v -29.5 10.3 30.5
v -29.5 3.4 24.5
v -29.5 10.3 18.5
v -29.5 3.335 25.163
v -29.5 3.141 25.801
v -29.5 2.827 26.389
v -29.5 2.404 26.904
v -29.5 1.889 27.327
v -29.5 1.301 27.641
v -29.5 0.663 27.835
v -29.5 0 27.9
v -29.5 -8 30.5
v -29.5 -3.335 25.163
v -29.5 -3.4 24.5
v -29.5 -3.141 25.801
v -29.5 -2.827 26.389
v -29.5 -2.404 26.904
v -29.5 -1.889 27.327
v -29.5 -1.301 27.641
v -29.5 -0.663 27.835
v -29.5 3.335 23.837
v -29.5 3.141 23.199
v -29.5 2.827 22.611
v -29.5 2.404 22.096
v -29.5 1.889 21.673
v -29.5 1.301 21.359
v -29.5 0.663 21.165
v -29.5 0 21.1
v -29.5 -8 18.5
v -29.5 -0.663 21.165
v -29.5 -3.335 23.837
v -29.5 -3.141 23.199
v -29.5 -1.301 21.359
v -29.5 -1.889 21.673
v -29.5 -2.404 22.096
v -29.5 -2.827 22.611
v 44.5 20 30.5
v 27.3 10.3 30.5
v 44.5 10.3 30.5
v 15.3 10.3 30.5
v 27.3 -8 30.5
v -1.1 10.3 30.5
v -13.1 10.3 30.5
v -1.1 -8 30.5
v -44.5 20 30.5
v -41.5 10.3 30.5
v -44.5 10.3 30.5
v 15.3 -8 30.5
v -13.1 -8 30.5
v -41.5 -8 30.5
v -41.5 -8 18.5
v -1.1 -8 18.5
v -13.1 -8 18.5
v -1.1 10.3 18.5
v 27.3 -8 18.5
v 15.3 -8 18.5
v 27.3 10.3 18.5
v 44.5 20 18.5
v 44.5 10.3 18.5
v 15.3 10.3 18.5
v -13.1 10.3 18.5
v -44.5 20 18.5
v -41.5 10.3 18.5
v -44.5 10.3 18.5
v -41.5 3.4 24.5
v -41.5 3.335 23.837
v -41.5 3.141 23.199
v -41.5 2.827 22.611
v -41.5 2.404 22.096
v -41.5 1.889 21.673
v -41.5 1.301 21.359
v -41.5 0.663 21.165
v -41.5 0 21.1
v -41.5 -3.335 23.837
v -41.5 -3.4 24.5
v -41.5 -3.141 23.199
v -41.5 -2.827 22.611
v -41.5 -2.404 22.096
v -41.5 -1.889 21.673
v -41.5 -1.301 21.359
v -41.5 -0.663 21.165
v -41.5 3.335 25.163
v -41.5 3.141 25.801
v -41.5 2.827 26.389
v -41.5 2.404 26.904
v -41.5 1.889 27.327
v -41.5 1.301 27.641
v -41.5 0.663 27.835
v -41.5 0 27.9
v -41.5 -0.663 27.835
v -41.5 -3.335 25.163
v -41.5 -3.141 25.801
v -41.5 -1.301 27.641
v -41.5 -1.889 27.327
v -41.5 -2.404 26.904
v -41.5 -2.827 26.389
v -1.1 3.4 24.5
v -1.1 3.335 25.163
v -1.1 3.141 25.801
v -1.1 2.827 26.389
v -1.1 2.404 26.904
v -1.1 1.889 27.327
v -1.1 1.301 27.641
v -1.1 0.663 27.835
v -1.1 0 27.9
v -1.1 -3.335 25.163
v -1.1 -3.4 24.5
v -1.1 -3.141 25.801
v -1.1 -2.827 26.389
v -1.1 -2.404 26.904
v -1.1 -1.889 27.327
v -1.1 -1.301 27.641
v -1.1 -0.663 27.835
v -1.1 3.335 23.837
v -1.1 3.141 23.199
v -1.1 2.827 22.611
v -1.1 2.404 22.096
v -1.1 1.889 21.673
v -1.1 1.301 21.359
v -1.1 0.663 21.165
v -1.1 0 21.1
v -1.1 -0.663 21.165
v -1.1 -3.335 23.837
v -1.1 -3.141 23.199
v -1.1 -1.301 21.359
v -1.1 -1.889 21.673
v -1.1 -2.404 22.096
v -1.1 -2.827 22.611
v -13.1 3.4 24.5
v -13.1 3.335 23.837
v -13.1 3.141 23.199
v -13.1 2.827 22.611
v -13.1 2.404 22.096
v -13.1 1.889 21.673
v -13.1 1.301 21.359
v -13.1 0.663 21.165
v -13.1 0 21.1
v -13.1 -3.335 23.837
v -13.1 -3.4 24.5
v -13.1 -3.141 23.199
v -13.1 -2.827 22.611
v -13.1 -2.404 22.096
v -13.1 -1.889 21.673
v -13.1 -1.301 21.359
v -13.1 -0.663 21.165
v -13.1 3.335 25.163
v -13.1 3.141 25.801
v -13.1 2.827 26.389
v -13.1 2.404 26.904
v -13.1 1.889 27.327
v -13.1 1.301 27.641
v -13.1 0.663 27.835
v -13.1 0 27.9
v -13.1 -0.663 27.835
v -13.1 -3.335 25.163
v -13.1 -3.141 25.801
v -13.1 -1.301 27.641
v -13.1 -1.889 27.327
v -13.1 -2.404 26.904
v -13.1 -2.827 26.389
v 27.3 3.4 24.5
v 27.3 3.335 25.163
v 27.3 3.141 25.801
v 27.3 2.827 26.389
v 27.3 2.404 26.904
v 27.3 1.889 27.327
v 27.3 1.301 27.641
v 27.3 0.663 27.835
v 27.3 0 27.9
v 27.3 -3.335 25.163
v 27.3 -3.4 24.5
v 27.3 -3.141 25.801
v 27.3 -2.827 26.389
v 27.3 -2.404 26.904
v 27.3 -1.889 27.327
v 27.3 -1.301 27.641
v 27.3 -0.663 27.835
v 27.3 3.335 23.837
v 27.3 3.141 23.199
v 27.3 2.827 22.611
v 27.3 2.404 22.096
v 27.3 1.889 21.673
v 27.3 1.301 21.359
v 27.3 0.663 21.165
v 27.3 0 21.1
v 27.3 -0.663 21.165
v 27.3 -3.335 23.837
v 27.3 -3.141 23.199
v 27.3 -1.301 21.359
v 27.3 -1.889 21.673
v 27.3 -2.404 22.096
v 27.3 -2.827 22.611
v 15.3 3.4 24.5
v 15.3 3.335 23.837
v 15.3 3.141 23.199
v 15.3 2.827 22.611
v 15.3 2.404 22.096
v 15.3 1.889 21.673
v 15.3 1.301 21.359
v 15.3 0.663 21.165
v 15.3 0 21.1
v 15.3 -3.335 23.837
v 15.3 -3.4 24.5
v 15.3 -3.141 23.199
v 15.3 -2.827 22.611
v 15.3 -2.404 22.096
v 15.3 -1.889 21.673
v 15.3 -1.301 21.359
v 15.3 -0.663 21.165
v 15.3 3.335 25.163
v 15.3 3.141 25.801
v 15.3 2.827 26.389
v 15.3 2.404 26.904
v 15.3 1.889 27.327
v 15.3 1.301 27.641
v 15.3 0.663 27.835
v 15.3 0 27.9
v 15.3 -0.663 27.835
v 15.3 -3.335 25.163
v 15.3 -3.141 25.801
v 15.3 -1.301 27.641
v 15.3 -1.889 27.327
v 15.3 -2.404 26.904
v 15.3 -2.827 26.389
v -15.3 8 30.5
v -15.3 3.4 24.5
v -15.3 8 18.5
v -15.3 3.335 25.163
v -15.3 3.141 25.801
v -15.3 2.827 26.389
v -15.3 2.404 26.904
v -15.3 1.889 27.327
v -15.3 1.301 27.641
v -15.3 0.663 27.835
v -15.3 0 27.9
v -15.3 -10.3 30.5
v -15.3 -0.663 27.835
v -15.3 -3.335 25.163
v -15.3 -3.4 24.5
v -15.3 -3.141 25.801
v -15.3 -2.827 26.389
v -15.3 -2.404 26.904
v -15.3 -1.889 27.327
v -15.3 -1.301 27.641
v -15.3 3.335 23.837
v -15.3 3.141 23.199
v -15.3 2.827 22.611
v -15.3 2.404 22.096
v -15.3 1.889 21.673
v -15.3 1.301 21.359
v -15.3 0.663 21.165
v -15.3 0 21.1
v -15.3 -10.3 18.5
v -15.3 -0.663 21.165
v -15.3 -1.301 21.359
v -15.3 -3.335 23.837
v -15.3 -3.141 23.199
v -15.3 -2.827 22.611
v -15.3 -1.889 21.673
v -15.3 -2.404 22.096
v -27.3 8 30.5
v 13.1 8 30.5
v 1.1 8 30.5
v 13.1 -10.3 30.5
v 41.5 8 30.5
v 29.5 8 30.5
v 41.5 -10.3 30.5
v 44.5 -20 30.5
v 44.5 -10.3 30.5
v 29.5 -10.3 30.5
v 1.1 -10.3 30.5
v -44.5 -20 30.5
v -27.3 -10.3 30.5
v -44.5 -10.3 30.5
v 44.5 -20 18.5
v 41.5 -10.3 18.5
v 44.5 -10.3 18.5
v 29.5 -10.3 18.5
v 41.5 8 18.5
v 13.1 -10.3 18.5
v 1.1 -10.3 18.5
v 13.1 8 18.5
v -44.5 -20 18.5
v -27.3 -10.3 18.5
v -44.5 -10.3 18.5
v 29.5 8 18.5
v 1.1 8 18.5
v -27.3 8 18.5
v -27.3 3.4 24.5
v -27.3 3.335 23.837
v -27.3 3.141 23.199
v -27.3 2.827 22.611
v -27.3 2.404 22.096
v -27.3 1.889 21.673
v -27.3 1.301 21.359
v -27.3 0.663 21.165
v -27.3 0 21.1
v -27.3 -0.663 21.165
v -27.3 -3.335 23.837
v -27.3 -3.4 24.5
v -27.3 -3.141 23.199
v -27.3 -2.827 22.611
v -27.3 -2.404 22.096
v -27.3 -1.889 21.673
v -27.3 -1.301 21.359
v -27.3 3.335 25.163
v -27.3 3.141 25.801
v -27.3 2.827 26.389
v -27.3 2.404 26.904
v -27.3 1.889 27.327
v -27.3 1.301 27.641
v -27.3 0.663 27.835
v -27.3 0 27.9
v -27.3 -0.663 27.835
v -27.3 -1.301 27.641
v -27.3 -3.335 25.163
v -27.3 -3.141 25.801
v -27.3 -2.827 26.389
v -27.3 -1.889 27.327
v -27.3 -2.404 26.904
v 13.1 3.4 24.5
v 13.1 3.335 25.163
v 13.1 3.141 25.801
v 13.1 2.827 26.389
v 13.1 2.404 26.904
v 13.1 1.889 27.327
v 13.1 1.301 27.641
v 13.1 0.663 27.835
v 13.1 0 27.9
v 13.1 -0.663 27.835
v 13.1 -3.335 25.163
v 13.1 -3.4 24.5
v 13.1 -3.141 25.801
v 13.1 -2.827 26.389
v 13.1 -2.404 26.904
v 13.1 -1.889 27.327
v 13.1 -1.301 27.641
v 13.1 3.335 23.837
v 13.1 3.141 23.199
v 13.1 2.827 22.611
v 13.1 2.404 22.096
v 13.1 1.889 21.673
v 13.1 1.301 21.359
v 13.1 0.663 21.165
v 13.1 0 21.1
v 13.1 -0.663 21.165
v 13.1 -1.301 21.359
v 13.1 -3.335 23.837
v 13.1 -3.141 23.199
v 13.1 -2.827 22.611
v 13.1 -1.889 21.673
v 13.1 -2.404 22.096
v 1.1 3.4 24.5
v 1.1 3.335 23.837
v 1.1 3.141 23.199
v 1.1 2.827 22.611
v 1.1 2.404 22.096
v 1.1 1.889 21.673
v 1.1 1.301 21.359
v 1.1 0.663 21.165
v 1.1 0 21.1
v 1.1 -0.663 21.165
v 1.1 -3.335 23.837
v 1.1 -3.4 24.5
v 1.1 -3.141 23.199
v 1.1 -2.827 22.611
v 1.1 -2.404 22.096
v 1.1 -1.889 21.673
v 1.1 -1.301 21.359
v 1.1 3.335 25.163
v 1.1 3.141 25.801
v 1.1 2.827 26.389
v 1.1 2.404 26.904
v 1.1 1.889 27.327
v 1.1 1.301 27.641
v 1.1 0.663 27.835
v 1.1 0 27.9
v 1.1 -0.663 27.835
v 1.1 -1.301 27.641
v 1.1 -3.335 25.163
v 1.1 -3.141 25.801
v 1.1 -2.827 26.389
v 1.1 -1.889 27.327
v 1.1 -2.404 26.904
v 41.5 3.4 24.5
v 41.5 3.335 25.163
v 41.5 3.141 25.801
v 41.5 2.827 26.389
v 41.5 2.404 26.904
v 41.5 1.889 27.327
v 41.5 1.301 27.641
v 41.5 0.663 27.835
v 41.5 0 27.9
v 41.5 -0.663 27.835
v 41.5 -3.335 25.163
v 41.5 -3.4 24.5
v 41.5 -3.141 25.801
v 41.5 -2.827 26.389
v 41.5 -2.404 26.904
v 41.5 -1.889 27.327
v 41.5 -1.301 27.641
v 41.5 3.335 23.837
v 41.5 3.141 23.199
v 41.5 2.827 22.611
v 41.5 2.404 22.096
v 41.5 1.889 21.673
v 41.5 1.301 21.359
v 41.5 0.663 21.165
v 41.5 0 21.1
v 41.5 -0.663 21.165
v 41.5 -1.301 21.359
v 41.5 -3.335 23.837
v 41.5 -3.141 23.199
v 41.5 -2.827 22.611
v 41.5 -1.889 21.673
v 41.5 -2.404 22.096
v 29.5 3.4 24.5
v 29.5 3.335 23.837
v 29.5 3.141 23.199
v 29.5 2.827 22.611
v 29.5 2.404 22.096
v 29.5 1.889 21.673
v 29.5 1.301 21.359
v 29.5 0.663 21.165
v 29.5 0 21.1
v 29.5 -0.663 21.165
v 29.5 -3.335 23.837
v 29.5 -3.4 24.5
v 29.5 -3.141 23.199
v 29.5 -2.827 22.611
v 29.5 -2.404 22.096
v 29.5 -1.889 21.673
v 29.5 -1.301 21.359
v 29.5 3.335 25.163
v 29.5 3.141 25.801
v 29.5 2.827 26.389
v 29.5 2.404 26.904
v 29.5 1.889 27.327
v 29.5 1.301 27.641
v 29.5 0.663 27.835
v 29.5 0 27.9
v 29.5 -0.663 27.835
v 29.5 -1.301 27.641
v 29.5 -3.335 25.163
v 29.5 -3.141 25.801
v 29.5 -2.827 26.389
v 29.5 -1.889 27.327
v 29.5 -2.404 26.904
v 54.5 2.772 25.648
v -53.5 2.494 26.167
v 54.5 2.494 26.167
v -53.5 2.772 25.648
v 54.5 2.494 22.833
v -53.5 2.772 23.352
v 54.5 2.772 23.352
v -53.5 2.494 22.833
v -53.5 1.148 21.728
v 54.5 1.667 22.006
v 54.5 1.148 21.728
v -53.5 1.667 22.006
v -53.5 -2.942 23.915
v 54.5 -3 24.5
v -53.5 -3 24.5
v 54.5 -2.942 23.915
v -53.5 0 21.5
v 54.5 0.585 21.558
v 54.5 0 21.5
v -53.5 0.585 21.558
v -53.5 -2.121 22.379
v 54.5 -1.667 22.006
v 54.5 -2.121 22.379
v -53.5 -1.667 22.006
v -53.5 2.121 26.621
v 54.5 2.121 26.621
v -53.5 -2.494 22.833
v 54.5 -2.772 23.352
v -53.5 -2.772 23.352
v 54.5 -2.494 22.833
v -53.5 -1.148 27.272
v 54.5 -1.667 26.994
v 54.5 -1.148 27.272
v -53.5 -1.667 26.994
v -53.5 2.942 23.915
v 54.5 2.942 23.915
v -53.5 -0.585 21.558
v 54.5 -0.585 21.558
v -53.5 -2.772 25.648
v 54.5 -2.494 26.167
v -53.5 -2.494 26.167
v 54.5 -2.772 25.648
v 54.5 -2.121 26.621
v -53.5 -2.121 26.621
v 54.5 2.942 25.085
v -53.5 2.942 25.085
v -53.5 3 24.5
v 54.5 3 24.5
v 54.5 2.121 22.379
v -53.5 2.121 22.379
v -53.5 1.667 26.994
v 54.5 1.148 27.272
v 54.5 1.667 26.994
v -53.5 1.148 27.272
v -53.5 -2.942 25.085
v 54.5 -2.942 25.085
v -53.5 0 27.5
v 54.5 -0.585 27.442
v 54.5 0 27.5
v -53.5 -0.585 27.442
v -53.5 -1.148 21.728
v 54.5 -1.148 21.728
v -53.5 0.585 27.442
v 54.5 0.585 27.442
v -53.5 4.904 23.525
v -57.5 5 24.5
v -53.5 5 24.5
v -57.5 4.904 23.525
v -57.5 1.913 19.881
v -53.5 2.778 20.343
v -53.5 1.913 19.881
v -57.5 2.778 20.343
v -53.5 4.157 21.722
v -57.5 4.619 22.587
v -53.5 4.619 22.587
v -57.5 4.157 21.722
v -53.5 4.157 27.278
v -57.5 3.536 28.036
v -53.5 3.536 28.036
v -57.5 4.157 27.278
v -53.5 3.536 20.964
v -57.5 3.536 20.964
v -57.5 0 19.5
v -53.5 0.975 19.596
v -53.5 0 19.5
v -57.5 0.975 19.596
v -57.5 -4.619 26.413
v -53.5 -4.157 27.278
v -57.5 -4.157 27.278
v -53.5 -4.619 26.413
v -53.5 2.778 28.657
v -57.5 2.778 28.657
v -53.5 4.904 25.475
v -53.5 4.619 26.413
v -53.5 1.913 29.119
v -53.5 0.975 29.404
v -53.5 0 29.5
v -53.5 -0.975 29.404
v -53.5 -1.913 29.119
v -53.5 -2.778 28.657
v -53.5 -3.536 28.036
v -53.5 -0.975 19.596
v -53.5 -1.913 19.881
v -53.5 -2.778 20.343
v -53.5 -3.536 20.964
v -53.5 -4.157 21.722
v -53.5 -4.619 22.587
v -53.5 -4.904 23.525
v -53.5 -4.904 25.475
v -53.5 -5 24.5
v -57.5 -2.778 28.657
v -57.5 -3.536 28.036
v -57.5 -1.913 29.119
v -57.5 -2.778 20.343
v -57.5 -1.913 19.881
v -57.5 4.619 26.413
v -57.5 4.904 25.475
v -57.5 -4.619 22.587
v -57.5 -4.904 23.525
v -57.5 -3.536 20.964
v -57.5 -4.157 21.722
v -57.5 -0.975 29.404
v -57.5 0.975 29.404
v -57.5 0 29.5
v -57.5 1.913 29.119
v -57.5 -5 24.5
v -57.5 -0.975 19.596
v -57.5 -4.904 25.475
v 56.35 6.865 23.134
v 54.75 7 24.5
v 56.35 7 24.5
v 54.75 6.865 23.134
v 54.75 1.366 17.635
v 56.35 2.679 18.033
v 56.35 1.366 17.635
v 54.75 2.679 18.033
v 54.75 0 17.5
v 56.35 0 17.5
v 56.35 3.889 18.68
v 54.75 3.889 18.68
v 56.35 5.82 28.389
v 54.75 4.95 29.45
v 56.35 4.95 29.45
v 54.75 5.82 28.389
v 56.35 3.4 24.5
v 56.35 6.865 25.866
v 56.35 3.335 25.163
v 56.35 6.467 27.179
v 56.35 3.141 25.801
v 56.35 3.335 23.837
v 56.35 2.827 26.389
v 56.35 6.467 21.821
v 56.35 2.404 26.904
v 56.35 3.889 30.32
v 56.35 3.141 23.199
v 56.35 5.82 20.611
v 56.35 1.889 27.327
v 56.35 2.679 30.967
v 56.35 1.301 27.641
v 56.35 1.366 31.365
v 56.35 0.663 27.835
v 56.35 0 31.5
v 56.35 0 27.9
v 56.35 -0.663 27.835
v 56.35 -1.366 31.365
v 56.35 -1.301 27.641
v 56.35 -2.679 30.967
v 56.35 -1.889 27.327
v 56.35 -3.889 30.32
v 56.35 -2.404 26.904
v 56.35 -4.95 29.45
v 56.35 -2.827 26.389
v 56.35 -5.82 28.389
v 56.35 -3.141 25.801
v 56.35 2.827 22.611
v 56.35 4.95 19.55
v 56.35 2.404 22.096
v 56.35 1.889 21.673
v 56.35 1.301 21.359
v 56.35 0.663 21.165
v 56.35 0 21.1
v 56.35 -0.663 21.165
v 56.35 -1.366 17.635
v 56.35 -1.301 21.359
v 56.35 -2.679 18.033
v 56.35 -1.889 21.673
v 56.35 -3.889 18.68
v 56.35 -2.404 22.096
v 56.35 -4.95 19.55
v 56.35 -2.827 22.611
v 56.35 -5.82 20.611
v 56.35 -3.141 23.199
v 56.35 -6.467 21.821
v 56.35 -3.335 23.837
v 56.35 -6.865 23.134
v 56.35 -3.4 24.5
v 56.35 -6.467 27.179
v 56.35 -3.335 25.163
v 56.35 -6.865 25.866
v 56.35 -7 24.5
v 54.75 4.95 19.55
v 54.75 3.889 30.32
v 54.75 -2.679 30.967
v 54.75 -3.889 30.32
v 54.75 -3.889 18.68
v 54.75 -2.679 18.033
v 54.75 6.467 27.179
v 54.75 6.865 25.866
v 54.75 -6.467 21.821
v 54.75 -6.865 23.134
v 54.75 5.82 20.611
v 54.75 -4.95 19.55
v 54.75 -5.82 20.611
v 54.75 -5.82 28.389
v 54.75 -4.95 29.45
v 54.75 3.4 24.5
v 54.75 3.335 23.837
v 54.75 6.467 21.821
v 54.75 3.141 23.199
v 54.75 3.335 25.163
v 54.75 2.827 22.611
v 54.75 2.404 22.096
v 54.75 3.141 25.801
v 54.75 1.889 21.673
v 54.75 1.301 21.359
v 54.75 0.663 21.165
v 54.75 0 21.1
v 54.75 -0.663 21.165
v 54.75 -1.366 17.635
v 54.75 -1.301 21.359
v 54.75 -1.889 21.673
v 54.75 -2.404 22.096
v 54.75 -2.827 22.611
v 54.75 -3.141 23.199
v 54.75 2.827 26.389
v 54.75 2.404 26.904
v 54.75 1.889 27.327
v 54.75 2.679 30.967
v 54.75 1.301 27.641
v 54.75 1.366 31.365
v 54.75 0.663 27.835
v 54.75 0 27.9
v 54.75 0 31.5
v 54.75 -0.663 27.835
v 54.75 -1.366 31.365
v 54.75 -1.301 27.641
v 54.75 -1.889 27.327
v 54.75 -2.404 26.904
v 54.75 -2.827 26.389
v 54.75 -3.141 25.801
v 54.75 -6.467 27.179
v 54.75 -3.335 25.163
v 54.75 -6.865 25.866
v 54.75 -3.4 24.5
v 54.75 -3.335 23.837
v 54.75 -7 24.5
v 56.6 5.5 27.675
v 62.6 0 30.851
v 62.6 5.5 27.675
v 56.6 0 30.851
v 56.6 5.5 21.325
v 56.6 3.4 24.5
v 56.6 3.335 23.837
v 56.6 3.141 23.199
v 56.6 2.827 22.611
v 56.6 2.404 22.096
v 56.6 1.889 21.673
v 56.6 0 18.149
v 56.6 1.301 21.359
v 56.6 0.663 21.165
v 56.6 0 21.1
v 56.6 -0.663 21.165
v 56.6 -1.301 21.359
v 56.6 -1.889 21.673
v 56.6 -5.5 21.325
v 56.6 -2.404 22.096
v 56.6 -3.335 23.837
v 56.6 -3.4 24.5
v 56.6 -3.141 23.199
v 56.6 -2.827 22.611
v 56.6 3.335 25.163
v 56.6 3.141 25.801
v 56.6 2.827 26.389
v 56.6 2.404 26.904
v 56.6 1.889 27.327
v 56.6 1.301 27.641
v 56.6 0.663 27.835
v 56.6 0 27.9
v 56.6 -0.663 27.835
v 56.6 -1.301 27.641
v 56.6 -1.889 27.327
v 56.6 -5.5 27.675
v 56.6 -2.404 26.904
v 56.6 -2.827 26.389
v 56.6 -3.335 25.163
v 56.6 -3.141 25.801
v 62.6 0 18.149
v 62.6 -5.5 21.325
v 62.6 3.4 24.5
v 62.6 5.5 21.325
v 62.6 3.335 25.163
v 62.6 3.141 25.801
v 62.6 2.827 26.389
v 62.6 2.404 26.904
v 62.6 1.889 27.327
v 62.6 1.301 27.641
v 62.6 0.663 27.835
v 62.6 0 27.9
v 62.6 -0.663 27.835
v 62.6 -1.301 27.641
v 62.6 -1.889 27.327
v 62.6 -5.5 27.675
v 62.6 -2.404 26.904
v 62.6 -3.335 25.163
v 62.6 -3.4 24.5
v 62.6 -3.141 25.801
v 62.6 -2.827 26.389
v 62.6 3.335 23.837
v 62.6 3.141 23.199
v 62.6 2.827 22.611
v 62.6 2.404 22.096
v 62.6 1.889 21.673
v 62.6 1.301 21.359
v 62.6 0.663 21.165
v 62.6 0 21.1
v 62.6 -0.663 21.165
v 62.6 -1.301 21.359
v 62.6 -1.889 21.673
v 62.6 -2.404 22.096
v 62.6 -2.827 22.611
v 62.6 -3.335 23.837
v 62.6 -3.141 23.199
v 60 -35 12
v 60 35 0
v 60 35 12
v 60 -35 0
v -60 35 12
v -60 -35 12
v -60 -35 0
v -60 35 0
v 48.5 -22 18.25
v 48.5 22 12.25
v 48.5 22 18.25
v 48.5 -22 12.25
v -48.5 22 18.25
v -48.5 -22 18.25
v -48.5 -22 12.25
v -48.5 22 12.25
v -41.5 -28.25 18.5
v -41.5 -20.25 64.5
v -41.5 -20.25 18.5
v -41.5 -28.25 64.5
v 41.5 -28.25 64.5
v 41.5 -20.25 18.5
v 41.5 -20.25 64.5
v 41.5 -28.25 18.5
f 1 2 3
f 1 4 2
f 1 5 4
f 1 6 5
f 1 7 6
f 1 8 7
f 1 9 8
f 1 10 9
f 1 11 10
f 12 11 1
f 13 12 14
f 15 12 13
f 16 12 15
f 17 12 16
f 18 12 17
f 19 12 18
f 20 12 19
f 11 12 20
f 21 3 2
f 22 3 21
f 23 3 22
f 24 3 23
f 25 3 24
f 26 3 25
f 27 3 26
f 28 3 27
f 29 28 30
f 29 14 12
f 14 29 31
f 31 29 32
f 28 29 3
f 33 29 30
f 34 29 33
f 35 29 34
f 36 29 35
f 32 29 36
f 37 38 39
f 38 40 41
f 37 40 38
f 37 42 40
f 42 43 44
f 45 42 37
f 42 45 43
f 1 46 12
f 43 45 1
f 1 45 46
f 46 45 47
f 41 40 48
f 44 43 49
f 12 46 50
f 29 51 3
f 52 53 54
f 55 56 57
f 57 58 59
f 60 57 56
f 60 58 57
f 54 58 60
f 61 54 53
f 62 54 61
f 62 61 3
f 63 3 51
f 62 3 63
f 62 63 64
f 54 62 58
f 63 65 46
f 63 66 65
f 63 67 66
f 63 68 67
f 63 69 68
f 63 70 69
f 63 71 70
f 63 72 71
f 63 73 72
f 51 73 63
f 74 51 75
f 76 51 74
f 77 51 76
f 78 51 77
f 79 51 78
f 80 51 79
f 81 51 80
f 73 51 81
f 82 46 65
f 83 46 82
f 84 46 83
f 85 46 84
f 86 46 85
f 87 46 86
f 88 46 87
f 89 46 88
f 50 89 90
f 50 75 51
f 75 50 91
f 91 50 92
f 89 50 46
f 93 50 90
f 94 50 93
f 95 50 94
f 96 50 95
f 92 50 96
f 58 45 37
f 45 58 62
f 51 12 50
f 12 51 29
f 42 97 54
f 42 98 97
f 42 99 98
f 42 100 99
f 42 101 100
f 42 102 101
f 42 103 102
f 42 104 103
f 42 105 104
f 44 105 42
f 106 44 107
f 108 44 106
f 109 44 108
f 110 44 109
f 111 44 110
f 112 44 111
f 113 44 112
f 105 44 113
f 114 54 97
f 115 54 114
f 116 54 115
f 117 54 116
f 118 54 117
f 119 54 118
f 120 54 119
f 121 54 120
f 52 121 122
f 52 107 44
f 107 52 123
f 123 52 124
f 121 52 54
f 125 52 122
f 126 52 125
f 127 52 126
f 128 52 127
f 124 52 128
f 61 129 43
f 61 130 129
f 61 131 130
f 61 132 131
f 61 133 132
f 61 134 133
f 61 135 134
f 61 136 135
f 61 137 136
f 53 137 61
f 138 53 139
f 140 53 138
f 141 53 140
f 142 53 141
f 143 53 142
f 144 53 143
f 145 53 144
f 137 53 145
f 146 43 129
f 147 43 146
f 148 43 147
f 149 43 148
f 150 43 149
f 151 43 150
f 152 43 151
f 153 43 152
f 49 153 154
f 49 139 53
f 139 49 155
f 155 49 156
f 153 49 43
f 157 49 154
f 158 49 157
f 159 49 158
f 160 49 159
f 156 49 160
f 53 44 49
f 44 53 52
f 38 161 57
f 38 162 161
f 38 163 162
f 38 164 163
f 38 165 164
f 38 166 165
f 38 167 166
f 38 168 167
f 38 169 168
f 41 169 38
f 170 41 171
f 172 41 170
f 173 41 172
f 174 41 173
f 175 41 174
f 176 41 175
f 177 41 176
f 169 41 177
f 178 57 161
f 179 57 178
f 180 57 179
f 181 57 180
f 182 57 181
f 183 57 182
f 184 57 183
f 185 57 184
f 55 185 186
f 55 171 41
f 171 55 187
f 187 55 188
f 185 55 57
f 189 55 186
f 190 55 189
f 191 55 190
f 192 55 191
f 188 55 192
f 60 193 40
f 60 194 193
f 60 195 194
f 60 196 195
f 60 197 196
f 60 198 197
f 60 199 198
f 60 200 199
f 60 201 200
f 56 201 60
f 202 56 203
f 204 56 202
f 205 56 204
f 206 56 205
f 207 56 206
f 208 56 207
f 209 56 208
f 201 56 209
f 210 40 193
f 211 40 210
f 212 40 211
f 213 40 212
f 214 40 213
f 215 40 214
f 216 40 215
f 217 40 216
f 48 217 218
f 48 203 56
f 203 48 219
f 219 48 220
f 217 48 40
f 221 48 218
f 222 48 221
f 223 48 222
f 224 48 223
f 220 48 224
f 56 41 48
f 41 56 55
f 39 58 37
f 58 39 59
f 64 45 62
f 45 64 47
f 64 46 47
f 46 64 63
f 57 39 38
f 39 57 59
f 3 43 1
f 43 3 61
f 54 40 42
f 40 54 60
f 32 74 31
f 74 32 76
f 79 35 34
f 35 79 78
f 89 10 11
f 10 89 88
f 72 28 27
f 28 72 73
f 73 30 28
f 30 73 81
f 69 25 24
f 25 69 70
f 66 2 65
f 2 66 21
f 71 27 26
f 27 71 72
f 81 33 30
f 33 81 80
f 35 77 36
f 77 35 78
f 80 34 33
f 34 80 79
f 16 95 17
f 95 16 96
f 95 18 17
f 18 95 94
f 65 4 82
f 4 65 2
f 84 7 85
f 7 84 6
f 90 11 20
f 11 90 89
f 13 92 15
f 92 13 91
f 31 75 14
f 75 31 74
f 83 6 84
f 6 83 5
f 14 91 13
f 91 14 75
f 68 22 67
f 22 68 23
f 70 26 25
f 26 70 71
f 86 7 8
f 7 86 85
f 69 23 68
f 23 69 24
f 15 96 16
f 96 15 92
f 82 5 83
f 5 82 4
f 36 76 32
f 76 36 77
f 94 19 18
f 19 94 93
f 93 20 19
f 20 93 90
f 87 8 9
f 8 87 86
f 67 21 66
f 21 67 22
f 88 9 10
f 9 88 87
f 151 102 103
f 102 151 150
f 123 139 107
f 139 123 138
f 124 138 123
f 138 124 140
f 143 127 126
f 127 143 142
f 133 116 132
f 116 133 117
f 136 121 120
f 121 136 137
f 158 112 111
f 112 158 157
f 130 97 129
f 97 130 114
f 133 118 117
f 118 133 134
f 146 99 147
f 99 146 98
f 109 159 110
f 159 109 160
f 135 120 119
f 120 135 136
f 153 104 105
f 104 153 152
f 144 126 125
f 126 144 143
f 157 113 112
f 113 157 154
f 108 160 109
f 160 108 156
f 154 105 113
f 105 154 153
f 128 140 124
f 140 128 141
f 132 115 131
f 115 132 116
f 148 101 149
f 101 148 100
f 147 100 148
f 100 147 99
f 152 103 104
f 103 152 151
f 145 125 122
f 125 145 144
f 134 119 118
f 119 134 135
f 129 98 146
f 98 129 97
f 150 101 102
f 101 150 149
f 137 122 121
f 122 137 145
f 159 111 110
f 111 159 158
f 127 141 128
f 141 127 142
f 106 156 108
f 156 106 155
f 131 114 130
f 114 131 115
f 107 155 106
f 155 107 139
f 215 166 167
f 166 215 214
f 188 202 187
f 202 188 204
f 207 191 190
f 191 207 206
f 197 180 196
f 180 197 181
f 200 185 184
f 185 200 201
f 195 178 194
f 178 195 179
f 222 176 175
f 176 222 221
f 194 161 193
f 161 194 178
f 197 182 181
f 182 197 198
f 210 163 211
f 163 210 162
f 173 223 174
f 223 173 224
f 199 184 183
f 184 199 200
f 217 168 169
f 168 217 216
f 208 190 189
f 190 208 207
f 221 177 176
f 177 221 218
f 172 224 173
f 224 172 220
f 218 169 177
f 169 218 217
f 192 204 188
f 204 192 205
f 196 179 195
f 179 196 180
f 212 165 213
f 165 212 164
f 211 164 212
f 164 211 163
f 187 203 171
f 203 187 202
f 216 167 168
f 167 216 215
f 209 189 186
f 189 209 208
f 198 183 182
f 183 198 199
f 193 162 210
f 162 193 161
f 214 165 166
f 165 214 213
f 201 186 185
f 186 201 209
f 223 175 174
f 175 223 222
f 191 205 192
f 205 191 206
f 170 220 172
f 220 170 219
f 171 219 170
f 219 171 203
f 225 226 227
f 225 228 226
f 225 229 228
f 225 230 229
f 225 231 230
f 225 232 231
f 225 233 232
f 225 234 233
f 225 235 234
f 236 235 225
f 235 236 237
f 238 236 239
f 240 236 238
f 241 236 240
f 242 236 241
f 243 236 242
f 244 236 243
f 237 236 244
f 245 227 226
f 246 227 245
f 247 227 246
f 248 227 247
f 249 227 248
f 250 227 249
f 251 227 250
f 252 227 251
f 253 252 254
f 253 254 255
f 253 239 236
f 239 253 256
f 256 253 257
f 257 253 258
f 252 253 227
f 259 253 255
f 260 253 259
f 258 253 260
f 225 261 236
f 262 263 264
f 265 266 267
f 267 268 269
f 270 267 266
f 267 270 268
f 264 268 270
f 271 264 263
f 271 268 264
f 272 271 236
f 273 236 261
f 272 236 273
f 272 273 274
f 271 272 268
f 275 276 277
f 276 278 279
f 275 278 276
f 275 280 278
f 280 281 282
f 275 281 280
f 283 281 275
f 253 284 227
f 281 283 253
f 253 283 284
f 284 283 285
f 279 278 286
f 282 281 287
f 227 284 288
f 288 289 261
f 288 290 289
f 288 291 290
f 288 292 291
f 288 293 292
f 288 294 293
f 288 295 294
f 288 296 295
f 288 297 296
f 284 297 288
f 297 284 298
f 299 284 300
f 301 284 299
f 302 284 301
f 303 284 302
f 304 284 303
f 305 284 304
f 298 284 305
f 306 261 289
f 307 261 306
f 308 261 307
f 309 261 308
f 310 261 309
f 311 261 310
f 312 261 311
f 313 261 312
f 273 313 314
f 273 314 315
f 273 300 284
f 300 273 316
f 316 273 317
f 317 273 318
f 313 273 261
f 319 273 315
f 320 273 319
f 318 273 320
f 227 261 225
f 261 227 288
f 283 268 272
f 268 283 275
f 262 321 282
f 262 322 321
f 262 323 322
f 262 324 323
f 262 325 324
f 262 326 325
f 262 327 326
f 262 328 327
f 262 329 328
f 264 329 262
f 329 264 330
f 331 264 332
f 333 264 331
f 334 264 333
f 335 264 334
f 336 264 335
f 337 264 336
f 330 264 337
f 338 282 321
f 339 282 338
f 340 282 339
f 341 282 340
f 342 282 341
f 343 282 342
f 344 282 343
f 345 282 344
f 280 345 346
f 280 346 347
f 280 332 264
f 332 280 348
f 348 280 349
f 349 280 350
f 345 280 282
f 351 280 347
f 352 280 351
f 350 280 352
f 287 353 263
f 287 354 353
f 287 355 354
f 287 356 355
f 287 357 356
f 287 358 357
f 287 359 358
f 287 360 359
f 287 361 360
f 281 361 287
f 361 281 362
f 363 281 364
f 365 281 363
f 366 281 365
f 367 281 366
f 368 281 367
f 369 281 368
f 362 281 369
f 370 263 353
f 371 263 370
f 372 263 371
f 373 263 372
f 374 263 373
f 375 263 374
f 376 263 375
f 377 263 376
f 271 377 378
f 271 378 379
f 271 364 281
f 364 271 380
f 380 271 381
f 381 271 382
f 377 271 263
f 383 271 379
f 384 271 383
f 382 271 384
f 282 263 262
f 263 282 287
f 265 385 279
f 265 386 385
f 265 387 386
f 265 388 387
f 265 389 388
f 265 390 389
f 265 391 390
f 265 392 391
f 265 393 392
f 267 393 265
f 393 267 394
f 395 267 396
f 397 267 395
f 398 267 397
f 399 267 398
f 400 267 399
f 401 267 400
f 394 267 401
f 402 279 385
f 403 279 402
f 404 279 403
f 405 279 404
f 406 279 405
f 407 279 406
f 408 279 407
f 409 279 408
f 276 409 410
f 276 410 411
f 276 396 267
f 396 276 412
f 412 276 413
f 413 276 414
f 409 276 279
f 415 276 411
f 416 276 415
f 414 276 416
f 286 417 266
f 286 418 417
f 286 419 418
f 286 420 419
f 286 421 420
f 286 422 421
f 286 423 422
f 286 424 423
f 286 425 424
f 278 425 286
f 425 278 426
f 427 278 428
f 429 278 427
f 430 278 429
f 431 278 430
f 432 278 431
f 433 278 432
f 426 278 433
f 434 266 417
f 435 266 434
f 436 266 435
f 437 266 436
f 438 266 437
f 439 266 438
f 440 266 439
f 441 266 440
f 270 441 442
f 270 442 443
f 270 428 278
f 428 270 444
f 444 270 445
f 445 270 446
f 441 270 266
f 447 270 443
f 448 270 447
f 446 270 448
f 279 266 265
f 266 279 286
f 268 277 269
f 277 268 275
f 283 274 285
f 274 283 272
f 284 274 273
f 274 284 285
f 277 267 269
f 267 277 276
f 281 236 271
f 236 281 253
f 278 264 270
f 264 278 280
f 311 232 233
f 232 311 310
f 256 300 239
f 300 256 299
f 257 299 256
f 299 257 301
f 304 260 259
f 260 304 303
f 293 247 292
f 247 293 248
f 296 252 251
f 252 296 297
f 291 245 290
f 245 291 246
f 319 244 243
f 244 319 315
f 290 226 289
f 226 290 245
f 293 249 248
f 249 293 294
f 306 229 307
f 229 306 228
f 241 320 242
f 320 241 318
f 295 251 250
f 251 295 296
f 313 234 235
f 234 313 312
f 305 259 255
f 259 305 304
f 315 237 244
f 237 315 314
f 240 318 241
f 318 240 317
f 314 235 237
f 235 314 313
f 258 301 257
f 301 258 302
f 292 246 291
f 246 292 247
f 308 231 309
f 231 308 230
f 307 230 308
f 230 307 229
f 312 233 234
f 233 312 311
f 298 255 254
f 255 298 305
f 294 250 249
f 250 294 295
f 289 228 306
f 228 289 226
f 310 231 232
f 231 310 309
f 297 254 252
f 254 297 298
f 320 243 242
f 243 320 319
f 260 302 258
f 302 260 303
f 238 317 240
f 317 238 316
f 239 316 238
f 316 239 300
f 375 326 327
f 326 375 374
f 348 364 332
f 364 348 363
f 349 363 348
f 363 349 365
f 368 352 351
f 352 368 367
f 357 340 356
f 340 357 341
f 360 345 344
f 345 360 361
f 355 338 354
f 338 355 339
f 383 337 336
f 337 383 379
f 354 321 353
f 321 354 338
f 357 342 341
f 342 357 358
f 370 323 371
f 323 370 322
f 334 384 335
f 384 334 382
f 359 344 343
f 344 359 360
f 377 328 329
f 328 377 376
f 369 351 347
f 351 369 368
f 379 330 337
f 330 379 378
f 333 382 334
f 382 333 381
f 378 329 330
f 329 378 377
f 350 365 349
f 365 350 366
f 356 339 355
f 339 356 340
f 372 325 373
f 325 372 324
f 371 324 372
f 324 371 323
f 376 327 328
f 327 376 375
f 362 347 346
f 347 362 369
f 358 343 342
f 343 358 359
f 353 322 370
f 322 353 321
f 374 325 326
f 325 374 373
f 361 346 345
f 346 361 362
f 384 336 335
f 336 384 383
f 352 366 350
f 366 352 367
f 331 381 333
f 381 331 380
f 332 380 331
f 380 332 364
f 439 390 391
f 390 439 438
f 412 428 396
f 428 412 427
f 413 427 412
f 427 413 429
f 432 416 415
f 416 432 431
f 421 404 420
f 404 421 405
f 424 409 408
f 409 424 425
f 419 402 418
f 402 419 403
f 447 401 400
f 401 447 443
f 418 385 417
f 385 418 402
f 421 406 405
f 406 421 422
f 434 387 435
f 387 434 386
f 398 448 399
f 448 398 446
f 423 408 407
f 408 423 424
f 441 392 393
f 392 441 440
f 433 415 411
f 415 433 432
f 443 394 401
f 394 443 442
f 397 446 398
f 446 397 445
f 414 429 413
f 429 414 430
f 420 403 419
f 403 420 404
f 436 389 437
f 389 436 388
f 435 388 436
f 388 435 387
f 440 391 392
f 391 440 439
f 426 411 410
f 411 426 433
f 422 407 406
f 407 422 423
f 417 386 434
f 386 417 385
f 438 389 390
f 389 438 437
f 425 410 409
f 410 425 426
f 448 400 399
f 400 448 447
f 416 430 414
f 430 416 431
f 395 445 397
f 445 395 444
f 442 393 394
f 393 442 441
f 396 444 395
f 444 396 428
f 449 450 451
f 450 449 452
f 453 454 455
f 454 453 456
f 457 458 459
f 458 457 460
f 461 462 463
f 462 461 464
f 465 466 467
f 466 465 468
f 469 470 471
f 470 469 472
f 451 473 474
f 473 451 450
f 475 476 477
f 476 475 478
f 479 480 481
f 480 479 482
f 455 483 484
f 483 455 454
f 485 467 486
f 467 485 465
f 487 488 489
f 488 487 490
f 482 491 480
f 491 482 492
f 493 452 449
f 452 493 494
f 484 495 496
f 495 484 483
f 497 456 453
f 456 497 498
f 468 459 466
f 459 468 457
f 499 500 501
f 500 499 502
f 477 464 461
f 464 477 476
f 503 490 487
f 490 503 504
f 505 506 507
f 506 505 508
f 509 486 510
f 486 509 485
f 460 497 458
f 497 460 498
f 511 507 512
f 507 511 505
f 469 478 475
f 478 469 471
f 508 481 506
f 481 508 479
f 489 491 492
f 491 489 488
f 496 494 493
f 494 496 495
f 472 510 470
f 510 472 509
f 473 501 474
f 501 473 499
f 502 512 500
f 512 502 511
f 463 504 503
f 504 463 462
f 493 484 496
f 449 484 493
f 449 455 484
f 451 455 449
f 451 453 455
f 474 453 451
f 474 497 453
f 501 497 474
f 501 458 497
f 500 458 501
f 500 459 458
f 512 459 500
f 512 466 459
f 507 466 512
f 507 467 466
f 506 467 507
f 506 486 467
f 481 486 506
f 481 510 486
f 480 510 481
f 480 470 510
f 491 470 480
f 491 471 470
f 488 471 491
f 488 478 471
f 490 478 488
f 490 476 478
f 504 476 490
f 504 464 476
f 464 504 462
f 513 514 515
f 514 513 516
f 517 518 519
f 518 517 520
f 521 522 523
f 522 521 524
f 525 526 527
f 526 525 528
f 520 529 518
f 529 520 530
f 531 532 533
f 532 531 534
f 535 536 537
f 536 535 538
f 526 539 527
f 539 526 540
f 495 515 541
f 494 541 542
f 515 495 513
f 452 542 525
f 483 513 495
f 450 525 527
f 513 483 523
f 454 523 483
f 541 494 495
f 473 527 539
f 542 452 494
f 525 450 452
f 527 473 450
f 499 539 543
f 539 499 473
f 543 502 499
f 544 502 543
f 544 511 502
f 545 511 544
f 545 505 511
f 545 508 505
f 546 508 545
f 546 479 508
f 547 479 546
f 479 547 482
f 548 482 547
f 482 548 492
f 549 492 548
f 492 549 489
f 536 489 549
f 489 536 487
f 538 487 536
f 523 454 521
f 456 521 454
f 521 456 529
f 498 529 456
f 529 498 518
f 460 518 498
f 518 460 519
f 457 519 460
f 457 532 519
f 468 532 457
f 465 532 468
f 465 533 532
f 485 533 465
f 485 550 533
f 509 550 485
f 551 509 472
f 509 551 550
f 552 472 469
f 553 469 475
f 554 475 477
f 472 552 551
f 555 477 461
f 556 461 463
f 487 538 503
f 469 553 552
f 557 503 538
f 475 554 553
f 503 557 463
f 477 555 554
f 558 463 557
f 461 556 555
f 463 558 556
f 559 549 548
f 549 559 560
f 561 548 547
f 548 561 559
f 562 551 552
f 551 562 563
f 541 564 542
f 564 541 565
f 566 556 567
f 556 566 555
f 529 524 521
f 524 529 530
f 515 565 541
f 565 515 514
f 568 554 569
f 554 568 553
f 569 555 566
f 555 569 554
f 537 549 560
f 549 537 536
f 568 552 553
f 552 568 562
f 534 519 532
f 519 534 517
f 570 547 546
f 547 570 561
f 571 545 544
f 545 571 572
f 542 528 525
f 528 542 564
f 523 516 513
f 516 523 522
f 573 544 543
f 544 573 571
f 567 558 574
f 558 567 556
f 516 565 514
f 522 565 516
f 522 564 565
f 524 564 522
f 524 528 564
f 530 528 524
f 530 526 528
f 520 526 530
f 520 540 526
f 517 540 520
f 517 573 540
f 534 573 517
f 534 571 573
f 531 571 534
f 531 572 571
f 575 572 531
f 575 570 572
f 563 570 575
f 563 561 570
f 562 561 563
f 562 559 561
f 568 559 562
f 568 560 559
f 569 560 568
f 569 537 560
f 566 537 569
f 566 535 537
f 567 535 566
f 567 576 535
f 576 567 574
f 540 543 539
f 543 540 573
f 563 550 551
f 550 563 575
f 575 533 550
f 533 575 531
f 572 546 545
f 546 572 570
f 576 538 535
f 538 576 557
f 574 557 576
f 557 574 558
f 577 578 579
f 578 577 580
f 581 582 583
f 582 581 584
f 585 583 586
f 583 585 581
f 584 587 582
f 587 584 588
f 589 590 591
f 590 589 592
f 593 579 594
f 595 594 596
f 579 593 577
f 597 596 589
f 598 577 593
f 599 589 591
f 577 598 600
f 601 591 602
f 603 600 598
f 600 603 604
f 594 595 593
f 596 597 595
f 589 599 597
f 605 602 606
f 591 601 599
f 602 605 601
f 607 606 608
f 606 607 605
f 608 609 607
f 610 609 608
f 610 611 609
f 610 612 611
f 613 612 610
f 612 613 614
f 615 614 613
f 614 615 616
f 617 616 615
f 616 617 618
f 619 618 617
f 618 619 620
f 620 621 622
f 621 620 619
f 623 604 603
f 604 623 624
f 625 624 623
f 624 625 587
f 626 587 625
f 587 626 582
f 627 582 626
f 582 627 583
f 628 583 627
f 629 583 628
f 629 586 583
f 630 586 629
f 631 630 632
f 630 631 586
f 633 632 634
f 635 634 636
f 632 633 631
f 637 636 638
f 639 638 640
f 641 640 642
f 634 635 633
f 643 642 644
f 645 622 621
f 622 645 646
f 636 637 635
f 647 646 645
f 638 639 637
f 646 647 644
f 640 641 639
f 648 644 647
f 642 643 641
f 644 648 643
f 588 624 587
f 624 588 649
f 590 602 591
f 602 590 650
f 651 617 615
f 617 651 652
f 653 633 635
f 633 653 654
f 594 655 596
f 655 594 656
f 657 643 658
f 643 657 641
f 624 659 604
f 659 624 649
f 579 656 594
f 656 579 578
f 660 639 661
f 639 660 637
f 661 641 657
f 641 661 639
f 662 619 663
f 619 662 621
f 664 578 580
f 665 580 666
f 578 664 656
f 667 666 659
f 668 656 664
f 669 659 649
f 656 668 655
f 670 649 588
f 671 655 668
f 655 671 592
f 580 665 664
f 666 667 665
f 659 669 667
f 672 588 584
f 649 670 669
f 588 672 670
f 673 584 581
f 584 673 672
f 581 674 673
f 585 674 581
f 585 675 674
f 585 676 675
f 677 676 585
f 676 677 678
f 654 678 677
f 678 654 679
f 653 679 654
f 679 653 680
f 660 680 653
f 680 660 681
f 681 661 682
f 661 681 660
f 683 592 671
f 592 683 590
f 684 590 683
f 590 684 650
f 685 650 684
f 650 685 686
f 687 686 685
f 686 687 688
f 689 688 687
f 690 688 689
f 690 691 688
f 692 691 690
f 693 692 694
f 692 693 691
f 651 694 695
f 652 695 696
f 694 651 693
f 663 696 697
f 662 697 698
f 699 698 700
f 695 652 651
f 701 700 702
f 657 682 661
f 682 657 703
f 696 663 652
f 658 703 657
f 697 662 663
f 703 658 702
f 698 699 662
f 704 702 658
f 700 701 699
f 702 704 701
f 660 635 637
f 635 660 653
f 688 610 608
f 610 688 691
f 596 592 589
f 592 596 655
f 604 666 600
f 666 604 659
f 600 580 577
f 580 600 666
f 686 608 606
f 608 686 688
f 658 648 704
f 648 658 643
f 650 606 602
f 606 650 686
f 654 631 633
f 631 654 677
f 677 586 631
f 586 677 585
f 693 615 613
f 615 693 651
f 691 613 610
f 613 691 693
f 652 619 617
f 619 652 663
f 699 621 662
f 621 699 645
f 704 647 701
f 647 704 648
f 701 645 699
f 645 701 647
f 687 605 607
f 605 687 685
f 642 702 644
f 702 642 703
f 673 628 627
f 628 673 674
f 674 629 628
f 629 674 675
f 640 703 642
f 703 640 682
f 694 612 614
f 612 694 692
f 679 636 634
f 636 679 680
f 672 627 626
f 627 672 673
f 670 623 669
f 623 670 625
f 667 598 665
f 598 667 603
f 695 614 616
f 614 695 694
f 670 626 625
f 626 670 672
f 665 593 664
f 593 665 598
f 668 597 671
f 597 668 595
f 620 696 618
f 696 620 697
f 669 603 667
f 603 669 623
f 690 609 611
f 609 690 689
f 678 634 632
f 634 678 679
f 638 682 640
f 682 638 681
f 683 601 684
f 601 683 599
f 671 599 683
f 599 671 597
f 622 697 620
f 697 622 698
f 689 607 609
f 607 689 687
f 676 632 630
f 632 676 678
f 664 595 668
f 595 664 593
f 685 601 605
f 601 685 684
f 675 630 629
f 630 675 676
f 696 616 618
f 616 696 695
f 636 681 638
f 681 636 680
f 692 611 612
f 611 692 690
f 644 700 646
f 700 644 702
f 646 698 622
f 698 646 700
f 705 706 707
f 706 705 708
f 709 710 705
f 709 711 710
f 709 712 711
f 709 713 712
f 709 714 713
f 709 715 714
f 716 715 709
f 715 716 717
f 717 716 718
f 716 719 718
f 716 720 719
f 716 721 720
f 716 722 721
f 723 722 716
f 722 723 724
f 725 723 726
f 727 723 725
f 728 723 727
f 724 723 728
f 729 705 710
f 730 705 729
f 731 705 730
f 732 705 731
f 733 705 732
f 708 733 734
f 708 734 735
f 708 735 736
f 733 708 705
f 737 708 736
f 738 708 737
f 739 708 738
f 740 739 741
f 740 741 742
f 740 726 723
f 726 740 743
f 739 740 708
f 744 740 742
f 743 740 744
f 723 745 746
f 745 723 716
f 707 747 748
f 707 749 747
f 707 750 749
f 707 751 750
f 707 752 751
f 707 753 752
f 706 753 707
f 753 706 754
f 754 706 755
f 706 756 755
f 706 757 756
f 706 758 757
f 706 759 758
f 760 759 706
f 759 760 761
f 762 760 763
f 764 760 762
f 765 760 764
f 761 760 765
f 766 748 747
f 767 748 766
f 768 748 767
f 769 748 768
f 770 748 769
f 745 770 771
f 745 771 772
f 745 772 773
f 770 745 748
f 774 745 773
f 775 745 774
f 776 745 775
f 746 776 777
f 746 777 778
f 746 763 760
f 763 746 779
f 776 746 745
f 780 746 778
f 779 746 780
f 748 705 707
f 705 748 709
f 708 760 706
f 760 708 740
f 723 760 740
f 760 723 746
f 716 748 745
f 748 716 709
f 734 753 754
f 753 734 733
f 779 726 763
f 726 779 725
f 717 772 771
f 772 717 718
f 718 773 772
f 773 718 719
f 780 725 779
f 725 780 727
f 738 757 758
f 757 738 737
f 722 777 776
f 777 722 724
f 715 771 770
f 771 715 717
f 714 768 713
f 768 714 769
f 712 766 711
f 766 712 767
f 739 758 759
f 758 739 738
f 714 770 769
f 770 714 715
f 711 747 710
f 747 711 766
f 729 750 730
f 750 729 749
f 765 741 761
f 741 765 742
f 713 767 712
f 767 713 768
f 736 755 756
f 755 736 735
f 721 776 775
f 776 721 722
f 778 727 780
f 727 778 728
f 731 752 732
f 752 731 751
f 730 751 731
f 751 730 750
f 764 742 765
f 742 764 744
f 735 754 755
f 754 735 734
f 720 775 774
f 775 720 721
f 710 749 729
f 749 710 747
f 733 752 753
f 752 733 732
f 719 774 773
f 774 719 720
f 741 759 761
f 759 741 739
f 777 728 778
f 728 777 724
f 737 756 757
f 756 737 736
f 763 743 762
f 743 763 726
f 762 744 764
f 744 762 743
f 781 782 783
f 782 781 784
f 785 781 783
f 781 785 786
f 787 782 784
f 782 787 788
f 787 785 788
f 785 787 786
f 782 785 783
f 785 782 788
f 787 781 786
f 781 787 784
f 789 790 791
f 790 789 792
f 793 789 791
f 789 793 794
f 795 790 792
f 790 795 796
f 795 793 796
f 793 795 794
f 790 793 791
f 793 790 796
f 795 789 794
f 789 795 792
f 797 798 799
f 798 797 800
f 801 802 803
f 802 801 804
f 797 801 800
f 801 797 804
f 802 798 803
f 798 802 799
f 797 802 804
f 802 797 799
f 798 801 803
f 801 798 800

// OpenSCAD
$fn = 32;

// ------------------------------------------------------------------------
// Comb hinge with flap: leaf 89 x 20 mm, pin d6, flap 46 mm
// Every part is its own module, assembly() places every instance.
// ------------------------------------------------------------------------

// --- part 1 ---
module hinge_bed() {
  difference() {
    translate([-60, -35, 0]) cube([120, 70, 12]);
  }
}

// --- part 2 ---
module hinge_riser() {
  difference() {
    translate([-48.5, -22, 0]) cube([97, 44, 6]);
  }
}

// --- part 3 ---
module hinge_leaf_a() {
  difference() {
    union() {
      translate([-41.5, -8, -6]) cube([12, 28, 12]);
      translate([-13.1, -8, -6]) cube([12, 28, 12]);
      translate([15.3, -8, -6]) cube([12, 28, 12]);
      translate([-44.5, 10.3, -6]) cube([89, 9.7, 12]);
    }
    translate([-35.5, 0, 0]) rotate([0, 90, 0]) cylinder(h = 14, d = 6.8, center = true);
    translate([-7.1, 0, 0]) rotate([0, 90, 0]) cylinder(h = 14, d = 6.8, center = true);
    translate([21.3, 0, 0]) rotate([0, 90, 0]) cylinder(h = 14, d = 6.8, center = true);
  }
}

// --- part 4 ---
module hinge_leaf_b() {
  difference() {
    union() {
      translate([-27.3, -20, -6]) cube([12, 28, 12]);
      translate([1.1, -20, -6]) cube([12, 28, 12]);
      translate([29.5, -20, -6]) cube([12, 28, 12]);
      translate([-44.5, -20, -6]) cube([89, 9.7, 12]);
    }
    translate([-21.3, 0, 0]) rotate([0, 90, 0]) cylinder(h = 14, d = 6.8, center = true);
    translate([7.1, 0, 0]) rotate([0, 90, 0]) cylinder(h = 14, d = 6.8, center = true);
    translate([35.5, 0, 0]) rotate([0, 90, 0]) cylinder(h = 14, d = 6.8, center = true);
  }
}

// --- part 5 ---
module hinge_flap() {
  difference() {
    translate([-41.5, -23, 0]) cube([83, 46, 8]);
  }
}

// --- part 6 ---
module hinge_pin() {
  rotate([0, 90, 0]) cylinder(h = 109, d = 6, center = true);
  translate([-57.5, 0, 0]) rotate([0, 90, 0]) cylinder(h = 4, d = 10);
}

// --- part 7 ---
module pin_washer() {
  difference() {
      translate([0, 0, 0]) cylinder(h = 1.6, d = 14);
      translate([0, 0, -1]) cylinder(h = 3.6, d = 6.8);
    }
}

// --- part 8 ---
module pin_nut() {
  difference() {
    linear_extrude(height = 6) polygon(points = [[6.351, 0], [3.175, 5.5], [-3.175, 5.5], [-6.351, 0], [-3.175, -5.5], [3.175, -5.5]]);
    translate([0, 0, -1]) cylinder(h = 8, d = 6.8);
  }
}

// --- assembly ---
module assembly() {
  color([0.80, 0.24, 0.20]) translate([0, 0, 0]) rotate([0, 0, 0]) hinge_bed();
  color([0.20, 0.45, 0.75]) translate([0, 0, 12.25]) rotate([0, 0, 0]) hinge_riser();
  color([0.25, 0.62, 0.32]) translate([0, 0, 24.5]) rotate([0, 0, 0]) hinge_leaf_a();
  color([0.92, 0.70, 0.18]) translate([0, 0, 24.5]) rotate([0, 0, 0]) hinge_leaf_b();
  color([0.58, 0.35, 0.70]) translate([0, -20.25, 41.5]) rotate([90, 0, 0]) hinge_flap();
  color([0.16, 0.66, 0.66]) translate([0, 0, 24.5]) rotate([0, 0, 0]) hinge_pin();
  color([0.85, 0.48, 0.18]) translate([54.75, 0, 24.5]) rotate([0, 90, 0]) pin_washer();
  color([0.55, 0.60, 0.65]) translate([56.6, 0, 24.5]) rotate([0, 90, 0]) pin_nut();
}

assembly();
